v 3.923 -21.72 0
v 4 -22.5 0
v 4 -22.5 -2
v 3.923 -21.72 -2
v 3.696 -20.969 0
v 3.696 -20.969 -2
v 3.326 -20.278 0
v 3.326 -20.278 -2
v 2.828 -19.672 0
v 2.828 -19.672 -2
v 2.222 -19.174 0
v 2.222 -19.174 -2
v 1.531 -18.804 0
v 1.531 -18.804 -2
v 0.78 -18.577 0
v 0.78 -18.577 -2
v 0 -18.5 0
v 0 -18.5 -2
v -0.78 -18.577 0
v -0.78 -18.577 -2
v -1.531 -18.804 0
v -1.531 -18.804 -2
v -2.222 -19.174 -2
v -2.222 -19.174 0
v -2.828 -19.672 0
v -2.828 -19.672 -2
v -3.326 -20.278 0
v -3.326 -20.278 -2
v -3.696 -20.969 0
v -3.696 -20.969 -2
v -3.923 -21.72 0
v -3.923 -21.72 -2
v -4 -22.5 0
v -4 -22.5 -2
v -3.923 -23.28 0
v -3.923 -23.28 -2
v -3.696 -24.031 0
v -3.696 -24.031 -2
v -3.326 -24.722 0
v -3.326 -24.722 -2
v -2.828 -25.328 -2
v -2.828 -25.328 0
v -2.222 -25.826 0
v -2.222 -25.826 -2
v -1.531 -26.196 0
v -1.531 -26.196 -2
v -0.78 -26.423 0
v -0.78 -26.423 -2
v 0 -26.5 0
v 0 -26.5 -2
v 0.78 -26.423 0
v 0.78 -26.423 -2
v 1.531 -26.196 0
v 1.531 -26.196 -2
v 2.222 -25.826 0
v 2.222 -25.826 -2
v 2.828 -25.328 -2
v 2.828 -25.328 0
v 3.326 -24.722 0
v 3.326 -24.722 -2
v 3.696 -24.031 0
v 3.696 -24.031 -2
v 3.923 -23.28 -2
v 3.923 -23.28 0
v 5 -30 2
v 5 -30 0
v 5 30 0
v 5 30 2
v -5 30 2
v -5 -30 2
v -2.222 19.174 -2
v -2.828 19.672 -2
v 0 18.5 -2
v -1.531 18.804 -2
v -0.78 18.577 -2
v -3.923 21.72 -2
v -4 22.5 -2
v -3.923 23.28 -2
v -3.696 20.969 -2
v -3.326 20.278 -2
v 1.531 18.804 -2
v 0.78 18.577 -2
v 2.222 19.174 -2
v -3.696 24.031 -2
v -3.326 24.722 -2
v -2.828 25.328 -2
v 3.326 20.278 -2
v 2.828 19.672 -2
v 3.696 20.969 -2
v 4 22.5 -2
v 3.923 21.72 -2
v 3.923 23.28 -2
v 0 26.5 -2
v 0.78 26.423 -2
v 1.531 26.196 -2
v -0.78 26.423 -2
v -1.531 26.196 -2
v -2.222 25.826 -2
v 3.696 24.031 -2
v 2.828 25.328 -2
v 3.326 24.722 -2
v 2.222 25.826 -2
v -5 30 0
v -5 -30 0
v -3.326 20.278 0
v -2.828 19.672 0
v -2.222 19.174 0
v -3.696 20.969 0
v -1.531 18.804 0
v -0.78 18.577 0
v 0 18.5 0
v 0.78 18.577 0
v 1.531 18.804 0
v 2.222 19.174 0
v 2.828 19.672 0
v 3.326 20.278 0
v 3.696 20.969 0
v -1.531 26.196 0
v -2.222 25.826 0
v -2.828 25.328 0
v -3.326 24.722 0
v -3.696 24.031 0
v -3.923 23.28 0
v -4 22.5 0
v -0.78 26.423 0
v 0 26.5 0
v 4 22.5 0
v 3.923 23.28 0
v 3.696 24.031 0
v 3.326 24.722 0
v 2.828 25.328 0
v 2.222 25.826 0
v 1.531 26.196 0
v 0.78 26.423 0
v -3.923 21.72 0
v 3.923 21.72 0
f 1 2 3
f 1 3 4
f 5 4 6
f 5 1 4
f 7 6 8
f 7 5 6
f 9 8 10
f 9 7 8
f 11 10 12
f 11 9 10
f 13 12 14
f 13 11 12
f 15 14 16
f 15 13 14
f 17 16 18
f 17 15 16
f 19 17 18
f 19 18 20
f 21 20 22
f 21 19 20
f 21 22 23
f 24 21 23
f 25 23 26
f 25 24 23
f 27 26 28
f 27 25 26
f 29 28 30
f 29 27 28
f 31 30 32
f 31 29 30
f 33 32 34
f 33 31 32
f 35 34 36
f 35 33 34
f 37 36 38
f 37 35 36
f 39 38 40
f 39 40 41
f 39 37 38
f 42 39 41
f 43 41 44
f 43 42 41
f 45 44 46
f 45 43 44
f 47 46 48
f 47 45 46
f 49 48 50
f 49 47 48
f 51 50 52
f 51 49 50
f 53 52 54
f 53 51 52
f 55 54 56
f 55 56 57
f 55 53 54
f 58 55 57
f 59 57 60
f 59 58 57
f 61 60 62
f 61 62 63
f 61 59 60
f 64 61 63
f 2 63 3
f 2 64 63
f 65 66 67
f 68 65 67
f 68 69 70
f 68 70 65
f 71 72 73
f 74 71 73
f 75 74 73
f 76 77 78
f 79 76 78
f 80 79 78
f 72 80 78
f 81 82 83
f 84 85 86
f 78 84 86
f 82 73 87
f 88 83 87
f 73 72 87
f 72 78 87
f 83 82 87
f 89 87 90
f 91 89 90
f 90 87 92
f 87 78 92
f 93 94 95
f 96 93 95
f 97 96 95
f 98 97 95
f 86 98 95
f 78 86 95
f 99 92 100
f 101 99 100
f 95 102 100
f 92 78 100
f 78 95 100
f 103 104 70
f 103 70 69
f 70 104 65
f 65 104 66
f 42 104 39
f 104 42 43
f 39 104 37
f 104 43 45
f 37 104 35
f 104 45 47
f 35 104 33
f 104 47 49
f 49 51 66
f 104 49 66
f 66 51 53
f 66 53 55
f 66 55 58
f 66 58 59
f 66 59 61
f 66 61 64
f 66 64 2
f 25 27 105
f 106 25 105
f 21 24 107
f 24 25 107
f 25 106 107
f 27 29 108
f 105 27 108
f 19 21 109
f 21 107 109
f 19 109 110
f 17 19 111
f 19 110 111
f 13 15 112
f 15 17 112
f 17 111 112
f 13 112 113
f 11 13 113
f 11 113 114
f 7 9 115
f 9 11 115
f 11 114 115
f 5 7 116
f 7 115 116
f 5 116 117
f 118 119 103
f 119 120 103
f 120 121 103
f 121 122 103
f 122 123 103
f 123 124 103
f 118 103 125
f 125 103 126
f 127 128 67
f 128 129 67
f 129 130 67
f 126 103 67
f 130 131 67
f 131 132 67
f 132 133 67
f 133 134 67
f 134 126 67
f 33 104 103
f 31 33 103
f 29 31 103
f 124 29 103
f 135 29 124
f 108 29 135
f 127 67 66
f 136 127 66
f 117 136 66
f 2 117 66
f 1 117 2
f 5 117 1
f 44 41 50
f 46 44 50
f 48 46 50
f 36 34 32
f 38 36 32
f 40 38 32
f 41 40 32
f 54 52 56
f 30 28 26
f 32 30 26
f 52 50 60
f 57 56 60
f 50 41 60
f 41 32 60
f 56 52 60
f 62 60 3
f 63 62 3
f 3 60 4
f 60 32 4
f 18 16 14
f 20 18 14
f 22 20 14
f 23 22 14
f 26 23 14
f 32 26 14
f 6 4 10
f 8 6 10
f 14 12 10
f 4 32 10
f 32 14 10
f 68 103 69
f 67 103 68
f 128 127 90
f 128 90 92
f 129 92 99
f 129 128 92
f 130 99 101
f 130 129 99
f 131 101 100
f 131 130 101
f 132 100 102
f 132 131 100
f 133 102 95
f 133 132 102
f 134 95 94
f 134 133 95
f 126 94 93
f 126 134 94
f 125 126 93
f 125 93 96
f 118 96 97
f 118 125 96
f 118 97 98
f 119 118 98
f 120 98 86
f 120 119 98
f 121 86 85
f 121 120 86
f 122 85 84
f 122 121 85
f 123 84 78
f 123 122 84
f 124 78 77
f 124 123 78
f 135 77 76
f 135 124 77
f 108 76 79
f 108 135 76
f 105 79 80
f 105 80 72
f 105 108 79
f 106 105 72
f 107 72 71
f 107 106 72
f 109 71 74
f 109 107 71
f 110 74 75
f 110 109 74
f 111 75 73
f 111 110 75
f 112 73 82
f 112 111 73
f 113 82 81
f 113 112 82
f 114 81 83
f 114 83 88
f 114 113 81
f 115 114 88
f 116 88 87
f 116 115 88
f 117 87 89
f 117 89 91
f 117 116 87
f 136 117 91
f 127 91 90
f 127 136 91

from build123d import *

# Parameters (mm, degrees)
SKETCH1_W           = 10
SKETCH1_H           = 60
BOSS_EXTRUDE1_DEPTH = 2
SKETCH1_3_R         = 4
BOSS_EXTRUDE2_DEPTH = 2


with BuildPart() as part:
    # Sketch1 → Boss-Extrude1 (new body)
    with BuildSketch(Plane.XY):
        Rectangle(SKETCH1_W, SKETCH1_H)
    extrude(amount=BOSS_EXTRUDE1_DEPTH)

    # Sketch1<3> → Boss-Extrude2 (add)
    with BuildSketch(Plane.XY):
        with Locations((0, 22.5)):
            Circle(SKETCH1_3_R)
        with Locations((0, -22.5)):
            Circle(SKETCH1_3_R)
    extrude(amount=-BOSS_EXTRUDE2_DEPTH)


solid = part.part
